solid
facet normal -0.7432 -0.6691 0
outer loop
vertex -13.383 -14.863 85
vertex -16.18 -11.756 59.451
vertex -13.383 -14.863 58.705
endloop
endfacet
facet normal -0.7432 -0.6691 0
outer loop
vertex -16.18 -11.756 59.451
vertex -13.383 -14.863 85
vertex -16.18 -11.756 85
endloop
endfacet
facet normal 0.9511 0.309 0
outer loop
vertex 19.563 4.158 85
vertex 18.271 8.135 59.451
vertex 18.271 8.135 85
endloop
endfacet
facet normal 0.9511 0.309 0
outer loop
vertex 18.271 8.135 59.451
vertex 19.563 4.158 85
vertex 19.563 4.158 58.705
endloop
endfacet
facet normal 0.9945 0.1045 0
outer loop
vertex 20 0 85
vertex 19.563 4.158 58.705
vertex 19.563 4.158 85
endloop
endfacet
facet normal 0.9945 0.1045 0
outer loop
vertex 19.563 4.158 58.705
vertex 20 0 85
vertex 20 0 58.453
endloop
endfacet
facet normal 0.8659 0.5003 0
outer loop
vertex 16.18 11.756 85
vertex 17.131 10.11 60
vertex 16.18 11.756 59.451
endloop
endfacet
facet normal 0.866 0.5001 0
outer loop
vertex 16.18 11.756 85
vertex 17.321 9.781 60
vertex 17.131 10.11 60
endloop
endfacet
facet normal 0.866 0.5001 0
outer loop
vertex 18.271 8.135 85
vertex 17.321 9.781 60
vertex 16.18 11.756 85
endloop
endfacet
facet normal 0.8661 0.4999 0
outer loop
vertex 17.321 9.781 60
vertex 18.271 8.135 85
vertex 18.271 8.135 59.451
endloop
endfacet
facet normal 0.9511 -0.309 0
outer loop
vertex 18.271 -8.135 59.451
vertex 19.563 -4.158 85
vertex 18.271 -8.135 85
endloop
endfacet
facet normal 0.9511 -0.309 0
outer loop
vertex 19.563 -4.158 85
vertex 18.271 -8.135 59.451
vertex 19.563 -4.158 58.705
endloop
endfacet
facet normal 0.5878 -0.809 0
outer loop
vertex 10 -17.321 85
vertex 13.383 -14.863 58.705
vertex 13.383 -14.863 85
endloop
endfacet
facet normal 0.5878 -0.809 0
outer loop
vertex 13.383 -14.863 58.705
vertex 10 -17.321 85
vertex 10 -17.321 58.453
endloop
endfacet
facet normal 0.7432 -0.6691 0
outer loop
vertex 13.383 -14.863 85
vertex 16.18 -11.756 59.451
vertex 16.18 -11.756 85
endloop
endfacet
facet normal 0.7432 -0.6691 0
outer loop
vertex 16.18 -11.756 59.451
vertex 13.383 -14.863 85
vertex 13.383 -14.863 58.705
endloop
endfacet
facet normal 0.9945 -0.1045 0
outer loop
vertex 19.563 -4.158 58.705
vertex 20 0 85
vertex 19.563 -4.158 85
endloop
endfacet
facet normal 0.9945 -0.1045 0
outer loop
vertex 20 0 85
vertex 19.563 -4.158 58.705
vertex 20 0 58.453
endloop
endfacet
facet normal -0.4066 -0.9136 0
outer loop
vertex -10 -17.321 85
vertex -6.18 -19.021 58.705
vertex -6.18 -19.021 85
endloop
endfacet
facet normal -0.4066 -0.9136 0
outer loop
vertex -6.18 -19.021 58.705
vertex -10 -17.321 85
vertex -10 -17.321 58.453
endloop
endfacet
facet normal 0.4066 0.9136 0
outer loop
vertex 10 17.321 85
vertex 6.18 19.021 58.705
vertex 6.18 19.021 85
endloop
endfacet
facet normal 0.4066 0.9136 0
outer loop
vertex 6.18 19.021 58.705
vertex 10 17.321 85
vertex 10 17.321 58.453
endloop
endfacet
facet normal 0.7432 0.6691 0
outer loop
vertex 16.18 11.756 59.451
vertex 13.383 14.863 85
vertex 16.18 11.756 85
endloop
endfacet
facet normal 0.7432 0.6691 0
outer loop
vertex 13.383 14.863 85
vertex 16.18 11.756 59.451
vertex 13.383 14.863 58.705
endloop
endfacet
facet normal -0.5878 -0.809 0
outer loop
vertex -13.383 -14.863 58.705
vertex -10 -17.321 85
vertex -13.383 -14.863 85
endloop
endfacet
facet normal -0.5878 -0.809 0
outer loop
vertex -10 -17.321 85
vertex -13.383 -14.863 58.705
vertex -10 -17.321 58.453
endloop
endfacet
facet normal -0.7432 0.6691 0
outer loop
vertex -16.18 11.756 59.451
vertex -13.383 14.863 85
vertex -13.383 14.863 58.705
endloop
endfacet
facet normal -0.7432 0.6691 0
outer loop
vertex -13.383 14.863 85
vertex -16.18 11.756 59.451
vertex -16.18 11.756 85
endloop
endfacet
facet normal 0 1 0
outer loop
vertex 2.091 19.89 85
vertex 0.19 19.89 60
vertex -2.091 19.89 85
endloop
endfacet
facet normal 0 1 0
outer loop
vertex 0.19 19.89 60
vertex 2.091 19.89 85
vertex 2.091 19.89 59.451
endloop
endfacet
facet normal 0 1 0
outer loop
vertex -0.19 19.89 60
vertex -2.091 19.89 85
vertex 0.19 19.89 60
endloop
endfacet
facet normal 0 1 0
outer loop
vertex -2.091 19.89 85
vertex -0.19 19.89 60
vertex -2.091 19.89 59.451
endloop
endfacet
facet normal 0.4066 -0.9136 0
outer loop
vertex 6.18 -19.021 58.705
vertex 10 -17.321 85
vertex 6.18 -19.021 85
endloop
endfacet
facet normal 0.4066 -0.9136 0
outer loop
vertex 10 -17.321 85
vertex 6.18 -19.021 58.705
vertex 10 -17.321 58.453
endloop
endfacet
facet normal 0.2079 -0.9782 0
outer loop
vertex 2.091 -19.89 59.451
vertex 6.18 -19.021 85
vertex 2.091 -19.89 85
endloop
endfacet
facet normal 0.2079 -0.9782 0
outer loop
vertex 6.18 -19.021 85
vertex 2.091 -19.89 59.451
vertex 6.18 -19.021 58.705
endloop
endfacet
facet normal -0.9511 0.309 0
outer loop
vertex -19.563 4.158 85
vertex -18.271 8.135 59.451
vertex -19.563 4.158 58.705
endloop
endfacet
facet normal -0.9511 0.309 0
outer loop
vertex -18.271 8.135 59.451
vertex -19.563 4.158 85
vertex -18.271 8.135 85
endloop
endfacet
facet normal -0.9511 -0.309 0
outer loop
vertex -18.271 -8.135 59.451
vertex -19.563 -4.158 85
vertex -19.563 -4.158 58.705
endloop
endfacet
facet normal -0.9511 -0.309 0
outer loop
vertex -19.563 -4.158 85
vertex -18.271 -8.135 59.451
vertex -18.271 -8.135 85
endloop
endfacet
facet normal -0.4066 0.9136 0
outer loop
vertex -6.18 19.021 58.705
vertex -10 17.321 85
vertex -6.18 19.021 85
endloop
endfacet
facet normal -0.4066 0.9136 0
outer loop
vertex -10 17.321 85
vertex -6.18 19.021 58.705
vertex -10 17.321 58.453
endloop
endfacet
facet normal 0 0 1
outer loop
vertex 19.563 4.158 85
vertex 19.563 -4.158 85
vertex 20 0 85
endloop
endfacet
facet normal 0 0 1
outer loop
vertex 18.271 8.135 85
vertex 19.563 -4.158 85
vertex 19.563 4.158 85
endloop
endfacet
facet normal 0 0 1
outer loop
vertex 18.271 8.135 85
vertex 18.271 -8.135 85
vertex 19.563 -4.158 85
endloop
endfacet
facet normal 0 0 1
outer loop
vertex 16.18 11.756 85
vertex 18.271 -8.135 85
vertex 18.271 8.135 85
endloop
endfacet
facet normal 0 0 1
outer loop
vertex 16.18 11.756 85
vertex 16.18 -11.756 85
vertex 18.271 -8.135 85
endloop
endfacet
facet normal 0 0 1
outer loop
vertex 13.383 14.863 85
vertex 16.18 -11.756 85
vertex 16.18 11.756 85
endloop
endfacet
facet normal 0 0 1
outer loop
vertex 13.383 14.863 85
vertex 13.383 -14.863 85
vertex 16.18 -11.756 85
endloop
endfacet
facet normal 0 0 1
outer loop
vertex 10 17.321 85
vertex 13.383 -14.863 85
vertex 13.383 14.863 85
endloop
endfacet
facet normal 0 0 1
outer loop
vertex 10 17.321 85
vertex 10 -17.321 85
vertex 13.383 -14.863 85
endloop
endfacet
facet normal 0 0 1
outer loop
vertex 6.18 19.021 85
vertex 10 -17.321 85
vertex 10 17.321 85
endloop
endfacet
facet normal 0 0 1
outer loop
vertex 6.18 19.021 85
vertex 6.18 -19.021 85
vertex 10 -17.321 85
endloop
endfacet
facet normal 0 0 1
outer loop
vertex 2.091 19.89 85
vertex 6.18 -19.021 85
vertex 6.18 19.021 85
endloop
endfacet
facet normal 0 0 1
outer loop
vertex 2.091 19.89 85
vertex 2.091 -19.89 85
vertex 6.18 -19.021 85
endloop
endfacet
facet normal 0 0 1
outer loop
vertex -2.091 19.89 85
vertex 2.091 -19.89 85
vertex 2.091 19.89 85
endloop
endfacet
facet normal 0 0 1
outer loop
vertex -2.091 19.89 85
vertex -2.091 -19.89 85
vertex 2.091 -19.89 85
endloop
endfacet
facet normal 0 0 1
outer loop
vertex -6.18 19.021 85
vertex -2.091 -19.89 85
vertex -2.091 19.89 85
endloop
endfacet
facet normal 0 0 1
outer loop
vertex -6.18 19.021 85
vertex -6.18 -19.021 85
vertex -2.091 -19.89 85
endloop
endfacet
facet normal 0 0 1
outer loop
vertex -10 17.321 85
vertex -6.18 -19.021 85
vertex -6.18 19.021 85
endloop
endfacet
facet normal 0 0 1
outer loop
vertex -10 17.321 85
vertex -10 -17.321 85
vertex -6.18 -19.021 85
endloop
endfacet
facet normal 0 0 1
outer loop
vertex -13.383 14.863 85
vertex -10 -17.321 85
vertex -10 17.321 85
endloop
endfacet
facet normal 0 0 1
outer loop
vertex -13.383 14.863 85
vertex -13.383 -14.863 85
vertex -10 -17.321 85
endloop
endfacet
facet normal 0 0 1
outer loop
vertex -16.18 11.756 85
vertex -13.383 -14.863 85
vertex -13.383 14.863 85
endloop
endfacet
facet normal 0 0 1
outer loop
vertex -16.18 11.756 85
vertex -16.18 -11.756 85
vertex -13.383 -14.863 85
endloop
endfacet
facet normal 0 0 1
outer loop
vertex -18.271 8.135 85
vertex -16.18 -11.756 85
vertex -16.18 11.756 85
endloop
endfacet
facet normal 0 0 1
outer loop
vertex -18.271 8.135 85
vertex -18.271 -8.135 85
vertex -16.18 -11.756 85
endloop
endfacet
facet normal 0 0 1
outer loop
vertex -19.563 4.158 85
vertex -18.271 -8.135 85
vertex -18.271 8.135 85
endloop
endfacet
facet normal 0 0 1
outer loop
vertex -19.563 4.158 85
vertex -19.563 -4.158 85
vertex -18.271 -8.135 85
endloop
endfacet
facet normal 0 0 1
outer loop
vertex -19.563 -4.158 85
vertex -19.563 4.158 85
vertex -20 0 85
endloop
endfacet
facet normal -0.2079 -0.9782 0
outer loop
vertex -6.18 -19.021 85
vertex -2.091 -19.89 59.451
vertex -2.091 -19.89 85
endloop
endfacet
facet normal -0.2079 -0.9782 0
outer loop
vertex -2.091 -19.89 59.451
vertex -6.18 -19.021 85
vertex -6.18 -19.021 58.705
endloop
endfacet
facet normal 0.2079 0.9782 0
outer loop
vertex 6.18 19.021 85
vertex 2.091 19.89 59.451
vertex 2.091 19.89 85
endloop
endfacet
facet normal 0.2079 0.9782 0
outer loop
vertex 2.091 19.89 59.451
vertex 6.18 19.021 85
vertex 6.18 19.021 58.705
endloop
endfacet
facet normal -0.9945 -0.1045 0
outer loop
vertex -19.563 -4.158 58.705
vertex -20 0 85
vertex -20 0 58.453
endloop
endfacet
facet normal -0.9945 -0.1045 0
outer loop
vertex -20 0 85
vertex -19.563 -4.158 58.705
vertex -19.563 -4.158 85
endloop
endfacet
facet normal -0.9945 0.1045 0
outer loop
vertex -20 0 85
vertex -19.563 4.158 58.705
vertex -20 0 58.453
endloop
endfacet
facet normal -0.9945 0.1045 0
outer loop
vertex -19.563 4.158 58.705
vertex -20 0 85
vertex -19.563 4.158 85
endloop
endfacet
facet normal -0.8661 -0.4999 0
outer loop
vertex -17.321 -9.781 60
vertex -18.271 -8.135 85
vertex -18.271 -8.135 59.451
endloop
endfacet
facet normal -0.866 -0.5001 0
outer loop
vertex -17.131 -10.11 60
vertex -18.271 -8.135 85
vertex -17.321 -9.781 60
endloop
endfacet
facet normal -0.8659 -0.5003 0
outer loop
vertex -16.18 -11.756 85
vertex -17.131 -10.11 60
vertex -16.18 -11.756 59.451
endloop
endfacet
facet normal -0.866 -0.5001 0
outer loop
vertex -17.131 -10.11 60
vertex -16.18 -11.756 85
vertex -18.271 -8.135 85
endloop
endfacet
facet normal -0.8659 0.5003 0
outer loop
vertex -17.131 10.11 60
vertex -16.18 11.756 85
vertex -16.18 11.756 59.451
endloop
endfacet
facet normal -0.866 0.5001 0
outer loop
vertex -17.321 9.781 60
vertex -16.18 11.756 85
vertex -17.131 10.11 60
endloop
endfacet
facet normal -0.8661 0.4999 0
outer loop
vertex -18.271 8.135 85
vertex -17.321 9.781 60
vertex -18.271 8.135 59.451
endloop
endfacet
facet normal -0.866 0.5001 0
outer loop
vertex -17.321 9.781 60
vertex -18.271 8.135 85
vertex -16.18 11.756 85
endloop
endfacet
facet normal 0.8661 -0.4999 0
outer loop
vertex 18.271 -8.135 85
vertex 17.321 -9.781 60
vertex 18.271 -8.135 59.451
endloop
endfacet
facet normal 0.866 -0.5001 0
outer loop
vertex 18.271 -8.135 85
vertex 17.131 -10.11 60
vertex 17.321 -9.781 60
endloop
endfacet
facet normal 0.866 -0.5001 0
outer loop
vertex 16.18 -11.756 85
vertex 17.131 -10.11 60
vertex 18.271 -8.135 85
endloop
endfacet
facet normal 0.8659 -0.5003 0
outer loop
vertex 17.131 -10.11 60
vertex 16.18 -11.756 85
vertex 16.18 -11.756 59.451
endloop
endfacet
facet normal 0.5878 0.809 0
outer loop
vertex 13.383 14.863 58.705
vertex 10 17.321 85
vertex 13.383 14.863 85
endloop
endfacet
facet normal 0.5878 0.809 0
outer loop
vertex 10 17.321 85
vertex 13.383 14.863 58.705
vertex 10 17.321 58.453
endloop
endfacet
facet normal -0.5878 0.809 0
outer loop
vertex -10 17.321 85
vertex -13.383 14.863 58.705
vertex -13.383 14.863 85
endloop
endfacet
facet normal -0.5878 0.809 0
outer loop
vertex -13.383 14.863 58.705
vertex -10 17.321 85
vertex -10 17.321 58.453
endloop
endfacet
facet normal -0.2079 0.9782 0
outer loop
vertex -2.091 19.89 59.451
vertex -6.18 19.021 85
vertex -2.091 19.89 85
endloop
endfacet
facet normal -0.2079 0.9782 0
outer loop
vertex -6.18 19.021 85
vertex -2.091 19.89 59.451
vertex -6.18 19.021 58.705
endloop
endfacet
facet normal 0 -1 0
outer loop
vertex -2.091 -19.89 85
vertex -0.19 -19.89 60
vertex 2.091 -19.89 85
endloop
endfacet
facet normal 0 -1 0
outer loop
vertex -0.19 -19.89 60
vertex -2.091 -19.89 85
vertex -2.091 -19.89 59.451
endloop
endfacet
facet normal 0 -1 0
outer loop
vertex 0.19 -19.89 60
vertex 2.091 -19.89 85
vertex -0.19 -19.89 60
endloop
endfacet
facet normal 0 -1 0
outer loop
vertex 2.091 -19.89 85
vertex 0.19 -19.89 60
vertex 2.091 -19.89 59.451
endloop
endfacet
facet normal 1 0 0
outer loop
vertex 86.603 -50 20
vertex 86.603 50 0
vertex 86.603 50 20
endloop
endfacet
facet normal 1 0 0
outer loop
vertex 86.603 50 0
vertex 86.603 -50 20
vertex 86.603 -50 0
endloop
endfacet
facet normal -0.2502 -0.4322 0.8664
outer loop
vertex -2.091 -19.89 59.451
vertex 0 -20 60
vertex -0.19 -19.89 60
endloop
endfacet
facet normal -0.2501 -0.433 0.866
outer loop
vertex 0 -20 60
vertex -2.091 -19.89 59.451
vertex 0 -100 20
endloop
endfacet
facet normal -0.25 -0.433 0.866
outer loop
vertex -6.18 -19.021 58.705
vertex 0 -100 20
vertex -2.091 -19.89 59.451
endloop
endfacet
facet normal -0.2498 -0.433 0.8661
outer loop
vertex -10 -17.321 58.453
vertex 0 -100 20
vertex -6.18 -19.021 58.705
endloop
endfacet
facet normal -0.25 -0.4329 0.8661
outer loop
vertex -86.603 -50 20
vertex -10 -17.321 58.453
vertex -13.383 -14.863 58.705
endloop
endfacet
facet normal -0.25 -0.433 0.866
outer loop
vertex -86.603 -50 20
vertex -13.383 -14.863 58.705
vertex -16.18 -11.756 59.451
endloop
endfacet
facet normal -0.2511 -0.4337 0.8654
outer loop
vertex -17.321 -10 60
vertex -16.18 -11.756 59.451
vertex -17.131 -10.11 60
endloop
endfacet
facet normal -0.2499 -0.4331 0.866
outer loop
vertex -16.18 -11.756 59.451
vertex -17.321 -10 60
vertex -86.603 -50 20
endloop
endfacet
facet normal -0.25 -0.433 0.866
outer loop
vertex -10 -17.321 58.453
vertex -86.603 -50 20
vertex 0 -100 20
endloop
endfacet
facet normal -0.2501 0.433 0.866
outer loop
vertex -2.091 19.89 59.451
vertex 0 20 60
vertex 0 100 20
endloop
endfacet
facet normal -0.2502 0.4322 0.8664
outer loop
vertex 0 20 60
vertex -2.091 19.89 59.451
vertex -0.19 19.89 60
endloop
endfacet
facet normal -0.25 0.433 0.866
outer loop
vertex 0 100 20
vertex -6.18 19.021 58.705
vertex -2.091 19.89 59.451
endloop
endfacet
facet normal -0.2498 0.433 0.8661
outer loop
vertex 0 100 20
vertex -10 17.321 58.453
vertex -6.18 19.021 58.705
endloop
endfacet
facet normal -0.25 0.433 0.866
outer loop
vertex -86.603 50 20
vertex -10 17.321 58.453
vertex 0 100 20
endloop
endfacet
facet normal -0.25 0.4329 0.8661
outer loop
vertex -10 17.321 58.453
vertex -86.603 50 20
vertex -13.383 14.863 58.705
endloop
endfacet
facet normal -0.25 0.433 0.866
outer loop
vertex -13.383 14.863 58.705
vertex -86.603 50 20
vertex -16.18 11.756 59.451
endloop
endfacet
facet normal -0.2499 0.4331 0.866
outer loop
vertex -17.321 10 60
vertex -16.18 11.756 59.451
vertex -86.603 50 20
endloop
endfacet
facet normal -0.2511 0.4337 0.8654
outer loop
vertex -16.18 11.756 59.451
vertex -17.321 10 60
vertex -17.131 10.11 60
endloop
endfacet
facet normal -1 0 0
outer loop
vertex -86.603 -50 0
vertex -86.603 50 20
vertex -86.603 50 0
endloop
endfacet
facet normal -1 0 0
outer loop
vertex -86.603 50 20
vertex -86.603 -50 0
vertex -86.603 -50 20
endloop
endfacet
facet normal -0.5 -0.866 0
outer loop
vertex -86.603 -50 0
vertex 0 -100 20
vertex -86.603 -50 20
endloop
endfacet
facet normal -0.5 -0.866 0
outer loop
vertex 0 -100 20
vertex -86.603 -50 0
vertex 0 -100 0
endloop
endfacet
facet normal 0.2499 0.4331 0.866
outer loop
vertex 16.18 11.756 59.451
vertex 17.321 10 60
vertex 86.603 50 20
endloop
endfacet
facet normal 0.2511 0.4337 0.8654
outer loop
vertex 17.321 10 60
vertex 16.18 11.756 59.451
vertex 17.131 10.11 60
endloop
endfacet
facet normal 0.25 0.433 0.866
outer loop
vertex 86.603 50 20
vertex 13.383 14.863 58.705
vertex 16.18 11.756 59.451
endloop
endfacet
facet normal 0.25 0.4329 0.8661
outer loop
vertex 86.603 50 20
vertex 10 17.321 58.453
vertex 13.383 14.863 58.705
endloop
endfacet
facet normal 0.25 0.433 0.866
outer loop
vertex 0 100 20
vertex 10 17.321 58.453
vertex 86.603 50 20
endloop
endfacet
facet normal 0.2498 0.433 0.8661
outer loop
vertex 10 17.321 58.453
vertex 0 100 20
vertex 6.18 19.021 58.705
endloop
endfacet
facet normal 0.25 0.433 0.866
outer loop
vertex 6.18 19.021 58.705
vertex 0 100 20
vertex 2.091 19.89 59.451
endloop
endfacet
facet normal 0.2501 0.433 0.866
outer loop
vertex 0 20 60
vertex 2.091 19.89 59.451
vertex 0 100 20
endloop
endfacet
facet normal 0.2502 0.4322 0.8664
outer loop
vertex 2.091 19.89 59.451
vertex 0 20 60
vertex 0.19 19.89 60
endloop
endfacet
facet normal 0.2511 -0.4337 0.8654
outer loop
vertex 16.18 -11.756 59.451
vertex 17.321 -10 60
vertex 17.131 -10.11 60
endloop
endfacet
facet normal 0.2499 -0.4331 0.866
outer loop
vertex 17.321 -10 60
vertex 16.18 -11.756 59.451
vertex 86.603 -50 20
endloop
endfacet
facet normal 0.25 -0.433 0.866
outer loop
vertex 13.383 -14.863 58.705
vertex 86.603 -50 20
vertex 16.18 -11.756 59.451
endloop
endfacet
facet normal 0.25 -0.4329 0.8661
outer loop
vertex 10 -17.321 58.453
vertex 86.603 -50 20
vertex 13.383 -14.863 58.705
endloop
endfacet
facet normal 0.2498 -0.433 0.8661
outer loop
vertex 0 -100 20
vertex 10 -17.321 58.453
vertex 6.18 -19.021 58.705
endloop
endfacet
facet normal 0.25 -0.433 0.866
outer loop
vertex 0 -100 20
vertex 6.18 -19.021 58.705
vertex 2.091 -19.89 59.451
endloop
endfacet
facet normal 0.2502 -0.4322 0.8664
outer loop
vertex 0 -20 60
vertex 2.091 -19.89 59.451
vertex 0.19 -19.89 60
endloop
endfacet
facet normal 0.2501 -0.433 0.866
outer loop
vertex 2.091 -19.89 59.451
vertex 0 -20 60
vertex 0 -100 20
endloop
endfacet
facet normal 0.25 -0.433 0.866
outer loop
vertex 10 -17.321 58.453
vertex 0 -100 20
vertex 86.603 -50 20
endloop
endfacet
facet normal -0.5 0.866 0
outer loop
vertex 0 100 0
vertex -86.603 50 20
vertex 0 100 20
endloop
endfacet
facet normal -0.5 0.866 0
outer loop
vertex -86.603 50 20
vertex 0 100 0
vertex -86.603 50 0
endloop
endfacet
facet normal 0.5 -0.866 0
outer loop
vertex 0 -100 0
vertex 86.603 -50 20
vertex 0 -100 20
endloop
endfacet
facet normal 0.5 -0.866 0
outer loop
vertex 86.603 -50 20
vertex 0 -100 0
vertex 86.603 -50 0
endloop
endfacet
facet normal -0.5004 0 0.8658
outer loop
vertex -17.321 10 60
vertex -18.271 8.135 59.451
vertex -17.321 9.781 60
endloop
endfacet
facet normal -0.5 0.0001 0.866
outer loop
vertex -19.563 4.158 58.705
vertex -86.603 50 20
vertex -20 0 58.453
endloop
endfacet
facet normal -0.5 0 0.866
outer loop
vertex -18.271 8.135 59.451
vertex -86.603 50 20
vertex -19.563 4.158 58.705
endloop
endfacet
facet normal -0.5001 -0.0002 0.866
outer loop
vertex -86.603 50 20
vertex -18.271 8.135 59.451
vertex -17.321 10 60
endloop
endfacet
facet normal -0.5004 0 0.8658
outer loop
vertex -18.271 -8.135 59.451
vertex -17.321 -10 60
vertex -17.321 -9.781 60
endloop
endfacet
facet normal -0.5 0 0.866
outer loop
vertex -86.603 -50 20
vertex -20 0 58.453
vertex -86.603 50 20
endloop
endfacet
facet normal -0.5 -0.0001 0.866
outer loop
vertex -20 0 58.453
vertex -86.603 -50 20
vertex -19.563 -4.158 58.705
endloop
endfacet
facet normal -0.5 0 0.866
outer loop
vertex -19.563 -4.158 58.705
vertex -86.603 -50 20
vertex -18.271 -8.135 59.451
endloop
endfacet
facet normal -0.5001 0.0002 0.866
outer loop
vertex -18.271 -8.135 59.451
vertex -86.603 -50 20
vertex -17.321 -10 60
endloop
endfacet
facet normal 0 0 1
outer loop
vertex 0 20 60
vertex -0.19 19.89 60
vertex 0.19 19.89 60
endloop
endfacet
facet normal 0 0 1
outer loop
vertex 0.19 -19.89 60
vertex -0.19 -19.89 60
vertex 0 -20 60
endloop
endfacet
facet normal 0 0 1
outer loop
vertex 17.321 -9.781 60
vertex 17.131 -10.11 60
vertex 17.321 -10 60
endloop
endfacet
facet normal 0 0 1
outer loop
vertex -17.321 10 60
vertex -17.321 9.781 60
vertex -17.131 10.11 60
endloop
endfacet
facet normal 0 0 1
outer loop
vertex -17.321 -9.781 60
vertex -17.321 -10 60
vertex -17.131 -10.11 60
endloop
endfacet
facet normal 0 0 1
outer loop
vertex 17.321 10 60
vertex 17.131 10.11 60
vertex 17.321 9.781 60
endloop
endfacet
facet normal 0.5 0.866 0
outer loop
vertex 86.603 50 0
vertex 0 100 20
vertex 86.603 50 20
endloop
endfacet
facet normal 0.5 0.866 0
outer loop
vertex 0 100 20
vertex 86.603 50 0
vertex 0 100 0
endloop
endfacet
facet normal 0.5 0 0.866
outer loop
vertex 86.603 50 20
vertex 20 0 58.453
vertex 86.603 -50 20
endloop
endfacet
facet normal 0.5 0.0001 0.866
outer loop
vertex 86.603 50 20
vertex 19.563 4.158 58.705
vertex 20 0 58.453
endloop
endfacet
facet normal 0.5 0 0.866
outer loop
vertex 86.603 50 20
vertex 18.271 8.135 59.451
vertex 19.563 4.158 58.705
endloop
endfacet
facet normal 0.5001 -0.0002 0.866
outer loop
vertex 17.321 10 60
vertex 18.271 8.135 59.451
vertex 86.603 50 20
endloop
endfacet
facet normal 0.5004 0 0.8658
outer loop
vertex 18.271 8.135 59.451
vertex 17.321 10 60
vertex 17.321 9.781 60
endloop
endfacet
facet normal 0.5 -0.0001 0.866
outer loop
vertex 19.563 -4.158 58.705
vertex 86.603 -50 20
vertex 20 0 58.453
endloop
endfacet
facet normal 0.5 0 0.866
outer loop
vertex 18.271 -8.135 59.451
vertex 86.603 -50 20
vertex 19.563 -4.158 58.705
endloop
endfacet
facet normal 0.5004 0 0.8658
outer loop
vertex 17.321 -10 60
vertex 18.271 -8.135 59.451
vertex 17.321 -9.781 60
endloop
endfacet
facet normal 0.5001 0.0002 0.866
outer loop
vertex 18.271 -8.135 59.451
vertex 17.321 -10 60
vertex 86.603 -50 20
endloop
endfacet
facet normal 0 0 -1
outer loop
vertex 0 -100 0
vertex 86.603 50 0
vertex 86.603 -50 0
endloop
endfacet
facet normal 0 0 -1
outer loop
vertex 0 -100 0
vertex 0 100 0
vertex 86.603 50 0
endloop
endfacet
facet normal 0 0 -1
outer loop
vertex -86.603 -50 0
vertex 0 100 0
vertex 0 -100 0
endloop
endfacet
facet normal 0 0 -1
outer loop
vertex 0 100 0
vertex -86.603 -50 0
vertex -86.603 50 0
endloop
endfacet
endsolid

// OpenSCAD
/*
hull(){
    
     
    polygon(points=[[0,50],[-43,25],[-43,-25],[0,-50],[43,-25],[43,25]]);
}
;
*/
/*
module xexagon_base_large(){
    linear_extrude(20) scale(2) polygon(points=[[0,50],[-43,25],[-43,-25],[0,-50],[43,-25],[43,25]]);
}
;

module xexagon_base_small(){
    translate([0,0,60])
    linear_extrude(10) 
    scale(0.2) 
    polygon(points=[[0,50],[-43,25],[-43,-25],[0,-50],[43,-25],[43,25]], convexity = 1);
}
;
hull(){
    xexagon_base_large();
    xexagon_base_small();
}
;

translate([0,0,70])
cylinder(h = 30, r1 = 20, r2 = 20, center = true);
*/

;
/*
bx_le=20;
bx_r=100;
fn=6;
*/

module base_xexagon(bx_le = 20, bx_r = 100, fn = 6){
    linear_extrude(bx_le) rotate([0,0,90]) circle(r = bx_r, $fn = fn);   
}
;




translate([0,0,70])
cylinder(h = 30, r1 = 20, r2 = 20, center = true);


module base_extruded(){
    hull(){
        base_xexagon();
        translate([0,0,40]) base_xexagon(bx_r=20);
    }
}
;
//difference(){
base_extruded();

//};
//translate([0,0,0]) sphere(10);
